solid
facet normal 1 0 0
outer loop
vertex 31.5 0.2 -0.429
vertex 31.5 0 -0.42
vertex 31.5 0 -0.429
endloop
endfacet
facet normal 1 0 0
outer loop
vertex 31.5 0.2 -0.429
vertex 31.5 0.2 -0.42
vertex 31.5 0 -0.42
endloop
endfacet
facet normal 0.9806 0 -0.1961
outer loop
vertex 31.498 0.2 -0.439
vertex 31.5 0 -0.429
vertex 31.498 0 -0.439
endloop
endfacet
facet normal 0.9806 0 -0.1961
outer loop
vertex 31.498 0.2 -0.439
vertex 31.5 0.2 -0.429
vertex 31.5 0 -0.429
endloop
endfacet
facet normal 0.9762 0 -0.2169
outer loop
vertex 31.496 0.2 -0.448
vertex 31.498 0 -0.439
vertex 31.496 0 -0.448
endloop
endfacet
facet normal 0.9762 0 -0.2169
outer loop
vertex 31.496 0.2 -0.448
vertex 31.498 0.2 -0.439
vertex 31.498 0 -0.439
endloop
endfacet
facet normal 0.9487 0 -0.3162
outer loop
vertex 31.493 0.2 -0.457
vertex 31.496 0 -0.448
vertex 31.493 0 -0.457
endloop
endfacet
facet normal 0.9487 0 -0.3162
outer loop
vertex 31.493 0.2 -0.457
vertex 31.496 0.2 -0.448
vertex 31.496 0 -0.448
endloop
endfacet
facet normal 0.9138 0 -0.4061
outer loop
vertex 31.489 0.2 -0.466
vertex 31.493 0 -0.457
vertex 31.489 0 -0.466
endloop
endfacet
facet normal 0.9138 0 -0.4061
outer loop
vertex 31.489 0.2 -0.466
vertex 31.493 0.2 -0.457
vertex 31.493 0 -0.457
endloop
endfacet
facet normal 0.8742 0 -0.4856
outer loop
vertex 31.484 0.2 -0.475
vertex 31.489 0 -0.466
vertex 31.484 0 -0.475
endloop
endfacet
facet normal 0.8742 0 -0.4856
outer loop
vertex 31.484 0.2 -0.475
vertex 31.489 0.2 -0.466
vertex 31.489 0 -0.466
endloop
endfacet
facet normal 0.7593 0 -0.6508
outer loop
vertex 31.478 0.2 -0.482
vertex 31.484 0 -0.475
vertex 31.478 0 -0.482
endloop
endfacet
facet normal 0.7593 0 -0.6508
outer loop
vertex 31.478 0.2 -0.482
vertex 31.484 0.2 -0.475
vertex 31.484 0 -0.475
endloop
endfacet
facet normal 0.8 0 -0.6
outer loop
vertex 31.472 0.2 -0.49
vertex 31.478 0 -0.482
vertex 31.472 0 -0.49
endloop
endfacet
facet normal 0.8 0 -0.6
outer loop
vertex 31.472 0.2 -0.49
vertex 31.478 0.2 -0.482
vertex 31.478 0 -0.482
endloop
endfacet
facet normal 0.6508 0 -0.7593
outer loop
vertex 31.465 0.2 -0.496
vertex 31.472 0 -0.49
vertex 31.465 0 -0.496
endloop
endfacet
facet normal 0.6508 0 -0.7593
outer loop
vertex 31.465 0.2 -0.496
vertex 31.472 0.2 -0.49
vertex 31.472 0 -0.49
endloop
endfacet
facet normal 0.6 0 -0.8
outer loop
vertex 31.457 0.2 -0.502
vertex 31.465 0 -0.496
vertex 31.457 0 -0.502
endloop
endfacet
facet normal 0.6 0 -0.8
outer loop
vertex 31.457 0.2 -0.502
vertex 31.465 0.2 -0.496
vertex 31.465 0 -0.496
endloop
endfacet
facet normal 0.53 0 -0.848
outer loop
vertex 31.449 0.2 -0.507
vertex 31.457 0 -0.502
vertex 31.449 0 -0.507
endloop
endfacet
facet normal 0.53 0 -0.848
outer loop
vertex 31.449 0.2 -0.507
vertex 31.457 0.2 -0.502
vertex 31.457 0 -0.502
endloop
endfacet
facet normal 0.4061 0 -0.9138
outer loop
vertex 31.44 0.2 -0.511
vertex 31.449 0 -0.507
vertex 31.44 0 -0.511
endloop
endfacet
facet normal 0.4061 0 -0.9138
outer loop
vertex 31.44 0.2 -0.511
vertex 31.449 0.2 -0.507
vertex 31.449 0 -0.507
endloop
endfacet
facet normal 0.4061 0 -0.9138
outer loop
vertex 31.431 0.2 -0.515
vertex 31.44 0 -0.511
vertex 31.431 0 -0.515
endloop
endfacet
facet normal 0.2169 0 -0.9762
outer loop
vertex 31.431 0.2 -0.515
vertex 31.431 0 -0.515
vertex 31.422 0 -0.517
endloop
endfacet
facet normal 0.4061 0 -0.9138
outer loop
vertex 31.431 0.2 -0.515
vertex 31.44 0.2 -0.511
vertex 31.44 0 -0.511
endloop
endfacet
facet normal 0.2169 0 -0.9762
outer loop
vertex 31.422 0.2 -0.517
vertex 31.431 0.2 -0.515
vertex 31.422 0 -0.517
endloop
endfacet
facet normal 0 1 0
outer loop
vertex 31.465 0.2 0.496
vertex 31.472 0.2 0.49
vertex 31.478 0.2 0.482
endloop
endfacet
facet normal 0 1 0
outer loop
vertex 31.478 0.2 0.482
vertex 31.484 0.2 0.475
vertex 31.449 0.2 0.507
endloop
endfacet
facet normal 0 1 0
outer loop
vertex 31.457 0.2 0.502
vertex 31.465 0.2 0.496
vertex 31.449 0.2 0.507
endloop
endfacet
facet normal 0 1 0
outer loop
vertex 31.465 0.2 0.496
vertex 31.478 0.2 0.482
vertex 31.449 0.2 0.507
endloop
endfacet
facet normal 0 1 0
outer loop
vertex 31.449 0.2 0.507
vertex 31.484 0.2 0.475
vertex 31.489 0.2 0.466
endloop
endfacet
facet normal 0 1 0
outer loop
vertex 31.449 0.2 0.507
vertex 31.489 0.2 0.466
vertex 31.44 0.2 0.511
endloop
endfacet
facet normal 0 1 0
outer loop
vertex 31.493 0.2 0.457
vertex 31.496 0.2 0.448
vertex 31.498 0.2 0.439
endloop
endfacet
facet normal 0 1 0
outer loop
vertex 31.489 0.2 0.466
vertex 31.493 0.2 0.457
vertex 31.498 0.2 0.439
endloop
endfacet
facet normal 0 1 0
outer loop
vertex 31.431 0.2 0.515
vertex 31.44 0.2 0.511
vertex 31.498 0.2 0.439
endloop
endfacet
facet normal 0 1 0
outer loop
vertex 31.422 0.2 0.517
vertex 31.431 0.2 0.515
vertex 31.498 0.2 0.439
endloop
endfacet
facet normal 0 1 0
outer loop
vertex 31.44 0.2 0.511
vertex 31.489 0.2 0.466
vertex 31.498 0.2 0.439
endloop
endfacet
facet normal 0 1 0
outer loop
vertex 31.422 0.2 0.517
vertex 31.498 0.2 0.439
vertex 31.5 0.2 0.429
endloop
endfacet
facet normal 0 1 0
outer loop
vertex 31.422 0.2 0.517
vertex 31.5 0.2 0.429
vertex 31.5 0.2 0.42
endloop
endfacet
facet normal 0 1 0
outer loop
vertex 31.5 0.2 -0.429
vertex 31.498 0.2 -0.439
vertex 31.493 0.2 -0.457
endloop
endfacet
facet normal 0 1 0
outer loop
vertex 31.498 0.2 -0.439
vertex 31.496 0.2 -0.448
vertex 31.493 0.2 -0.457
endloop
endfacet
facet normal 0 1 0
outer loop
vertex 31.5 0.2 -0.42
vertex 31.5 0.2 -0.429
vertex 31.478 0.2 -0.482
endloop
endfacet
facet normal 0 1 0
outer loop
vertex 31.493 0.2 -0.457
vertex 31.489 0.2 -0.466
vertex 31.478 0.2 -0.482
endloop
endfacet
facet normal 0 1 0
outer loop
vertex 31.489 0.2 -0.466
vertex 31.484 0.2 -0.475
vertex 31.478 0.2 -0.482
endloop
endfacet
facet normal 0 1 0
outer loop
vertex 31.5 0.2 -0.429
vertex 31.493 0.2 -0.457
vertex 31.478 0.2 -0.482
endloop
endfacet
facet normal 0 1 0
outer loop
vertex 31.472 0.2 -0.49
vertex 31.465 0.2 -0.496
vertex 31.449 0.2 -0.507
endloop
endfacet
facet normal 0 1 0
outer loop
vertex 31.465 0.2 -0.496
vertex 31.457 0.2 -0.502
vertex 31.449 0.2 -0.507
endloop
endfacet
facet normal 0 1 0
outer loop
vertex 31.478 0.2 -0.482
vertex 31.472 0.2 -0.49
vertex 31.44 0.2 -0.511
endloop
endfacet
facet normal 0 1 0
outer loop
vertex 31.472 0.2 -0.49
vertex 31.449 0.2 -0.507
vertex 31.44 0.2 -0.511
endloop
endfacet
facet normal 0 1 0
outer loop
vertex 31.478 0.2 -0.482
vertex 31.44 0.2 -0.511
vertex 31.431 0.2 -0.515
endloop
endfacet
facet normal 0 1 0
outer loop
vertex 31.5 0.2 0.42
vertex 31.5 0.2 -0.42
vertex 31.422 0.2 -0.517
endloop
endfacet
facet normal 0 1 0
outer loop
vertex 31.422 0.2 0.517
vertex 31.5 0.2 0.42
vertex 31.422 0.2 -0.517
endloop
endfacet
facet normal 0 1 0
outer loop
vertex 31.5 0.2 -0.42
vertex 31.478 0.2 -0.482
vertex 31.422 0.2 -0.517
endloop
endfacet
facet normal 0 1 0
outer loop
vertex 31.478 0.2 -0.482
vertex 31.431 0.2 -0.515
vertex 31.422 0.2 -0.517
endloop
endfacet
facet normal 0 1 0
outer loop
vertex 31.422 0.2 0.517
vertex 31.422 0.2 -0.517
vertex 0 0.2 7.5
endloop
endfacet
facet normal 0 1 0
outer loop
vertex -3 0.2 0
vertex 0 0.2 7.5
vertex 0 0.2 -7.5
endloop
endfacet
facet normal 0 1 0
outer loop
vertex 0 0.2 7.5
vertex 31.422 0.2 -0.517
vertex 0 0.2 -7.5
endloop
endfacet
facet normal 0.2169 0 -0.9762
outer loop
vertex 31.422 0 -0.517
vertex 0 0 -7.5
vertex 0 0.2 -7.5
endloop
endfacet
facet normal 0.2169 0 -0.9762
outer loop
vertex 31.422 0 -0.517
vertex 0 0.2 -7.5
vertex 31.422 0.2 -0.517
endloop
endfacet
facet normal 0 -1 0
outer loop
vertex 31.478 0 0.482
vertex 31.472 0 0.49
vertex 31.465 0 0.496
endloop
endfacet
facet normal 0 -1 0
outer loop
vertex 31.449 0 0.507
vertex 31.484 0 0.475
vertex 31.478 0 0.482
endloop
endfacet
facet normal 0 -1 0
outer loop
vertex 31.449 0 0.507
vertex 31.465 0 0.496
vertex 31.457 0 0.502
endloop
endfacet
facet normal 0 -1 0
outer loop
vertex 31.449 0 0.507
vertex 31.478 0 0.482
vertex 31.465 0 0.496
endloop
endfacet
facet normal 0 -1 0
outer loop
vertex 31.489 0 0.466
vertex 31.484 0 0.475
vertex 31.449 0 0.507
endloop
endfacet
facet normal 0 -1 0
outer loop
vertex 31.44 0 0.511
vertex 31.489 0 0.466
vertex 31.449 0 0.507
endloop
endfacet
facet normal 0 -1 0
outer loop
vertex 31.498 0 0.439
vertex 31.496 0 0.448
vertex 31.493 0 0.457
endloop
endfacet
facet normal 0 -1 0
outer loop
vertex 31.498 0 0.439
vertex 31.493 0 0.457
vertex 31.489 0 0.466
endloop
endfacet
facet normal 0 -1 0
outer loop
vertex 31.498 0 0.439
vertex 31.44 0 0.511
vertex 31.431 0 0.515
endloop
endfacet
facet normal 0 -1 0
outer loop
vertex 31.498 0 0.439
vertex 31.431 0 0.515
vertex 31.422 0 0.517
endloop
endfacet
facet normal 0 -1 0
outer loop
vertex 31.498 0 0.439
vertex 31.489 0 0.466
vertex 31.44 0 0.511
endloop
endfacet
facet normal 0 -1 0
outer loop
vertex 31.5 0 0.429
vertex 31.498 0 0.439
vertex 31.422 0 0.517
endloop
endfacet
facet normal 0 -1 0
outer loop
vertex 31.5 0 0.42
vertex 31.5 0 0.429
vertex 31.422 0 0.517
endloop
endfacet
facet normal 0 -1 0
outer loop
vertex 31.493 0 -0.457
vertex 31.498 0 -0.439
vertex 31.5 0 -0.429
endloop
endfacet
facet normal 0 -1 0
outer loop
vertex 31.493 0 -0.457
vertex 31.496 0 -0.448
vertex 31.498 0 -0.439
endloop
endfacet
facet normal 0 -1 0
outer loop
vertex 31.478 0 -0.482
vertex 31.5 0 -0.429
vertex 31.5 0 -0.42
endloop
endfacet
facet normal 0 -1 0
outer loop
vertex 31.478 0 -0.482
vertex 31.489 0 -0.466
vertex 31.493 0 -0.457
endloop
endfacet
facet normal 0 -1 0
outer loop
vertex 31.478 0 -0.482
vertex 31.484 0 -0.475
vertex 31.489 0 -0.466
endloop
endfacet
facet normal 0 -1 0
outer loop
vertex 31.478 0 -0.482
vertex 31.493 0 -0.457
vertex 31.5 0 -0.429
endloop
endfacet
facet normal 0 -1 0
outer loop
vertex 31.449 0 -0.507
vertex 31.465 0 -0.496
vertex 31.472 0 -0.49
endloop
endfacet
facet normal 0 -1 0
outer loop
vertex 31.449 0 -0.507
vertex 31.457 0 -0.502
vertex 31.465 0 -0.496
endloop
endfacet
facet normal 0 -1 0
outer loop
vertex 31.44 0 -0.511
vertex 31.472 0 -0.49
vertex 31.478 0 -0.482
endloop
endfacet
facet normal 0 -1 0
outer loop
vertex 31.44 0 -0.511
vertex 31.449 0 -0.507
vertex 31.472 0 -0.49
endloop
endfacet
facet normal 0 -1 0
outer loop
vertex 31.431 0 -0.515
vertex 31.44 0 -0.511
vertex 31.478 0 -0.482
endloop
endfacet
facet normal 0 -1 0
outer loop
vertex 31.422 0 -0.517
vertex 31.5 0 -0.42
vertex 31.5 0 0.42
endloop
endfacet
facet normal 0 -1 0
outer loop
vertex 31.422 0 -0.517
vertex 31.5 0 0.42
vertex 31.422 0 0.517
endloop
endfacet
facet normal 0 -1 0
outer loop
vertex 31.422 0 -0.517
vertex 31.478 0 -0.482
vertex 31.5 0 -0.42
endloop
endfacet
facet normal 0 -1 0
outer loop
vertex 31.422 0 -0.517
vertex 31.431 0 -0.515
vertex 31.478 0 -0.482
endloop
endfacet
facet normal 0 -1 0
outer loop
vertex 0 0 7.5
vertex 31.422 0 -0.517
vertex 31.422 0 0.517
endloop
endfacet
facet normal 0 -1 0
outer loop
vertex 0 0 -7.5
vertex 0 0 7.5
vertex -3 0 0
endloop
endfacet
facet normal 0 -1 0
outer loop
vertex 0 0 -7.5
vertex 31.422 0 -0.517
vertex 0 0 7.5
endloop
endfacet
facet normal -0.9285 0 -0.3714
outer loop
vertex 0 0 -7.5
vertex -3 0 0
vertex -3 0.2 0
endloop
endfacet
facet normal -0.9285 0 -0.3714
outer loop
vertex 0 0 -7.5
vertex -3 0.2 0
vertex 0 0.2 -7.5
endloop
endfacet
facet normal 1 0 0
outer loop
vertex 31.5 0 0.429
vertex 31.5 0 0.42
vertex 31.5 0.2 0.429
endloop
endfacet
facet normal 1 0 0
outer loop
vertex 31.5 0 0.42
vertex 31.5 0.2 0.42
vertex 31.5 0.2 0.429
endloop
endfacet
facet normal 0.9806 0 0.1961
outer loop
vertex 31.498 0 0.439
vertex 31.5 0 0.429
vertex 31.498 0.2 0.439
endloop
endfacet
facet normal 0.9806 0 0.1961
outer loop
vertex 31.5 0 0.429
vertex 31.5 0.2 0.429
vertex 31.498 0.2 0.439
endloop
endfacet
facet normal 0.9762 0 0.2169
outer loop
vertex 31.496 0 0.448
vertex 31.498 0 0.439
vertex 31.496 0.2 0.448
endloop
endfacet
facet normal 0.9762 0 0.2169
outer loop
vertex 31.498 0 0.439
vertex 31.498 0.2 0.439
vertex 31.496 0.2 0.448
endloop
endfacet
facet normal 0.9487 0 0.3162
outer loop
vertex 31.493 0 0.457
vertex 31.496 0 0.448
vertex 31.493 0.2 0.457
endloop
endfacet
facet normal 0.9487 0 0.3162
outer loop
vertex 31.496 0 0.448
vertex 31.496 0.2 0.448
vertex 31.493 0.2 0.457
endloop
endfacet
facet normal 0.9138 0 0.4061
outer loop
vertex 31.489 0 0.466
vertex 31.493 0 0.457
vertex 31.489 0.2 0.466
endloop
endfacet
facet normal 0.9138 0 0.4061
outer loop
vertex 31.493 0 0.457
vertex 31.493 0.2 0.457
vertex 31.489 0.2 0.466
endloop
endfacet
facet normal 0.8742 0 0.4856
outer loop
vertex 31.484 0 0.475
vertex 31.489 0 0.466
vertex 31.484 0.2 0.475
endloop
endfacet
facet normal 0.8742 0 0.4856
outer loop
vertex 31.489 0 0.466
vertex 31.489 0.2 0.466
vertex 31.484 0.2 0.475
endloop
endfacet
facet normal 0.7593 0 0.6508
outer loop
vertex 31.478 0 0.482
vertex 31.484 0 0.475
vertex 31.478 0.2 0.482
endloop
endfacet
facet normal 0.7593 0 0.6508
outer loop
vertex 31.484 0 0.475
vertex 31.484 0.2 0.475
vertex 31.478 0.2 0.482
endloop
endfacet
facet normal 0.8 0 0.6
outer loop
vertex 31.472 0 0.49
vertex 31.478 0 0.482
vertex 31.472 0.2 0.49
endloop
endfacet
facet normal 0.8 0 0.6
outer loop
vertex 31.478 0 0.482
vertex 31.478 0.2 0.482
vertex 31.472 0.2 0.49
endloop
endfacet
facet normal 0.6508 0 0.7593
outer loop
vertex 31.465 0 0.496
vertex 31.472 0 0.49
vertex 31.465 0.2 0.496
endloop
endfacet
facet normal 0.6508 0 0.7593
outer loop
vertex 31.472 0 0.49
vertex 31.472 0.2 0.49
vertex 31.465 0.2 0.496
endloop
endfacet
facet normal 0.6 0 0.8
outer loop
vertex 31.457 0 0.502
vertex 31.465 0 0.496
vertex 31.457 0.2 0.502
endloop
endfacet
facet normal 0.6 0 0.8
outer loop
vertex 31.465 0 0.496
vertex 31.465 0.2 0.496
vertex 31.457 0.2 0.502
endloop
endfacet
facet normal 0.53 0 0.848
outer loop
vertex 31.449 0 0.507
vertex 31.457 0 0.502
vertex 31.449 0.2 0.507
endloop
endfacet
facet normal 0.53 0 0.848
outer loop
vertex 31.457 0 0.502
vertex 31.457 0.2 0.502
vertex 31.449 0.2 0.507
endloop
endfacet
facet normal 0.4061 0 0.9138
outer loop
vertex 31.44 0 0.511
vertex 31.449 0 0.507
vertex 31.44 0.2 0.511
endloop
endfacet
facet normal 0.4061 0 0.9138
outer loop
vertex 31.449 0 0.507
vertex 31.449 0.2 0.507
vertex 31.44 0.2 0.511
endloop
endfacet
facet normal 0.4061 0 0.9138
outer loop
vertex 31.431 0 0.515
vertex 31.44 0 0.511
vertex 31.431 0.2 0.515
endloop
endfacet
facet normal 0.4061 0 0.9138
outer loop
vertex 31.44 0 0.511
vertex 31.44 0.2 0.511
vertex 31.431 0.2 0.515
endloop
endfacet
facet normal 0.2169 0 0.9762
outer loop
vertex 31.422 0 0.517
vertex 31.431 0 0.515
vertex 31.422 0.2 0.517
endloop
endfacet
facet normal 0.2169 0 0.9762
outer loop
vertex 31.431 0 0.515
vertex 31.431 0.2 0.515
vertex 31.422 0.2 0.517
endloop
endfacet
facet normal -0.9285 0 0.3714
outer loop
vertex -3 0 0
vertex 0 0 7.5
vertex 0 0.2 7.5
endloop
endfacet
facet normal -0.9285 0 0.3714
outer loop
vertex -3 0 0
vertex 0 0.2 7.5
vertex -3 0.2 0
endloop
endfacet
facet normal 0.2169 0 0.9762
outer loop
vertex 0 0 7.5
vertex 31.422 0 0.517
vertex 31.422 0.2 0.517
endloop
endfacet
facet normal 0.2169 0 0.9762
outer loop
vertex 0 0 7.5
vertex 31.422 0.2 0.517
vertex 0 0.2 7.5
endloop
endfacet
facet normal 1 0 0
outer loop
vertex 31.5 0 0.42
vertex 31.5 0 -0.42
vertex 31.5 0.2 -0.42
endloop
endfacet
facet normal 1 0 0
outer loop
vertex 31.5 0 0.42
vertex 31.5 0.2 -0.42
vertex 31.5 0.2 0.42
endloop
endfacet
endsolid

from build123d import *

# Parameters (mm, degrees)
BOSS_EXTRUDE1_DEPTH = 0.2
FILLET4_R           = 0.1
FILLET5_R           = 0.1


with BuildPart() as part:
    # Sketch2 → Boss-Extrude1 (new body)
    with BuildSketch(Plane(origin=(0, 0, 0), x_dir=(1, 0, 0), z_dir=(0, 1, 0))):
        Polygon((-3, 0), (1e-09, 7.5), (31.5, 0.5), (31.5, -0.5), (1e-09, -7.5), align=None)
    extrude(amount=BOSS_EXTRUDE1_DEPTH)

    # Fillet4
    fillet4_edges = [part.edges().sort_by_distance(p)[0] for p in [
        (31.5, 0.1, 0.5),
    ]]
    fillet(fillet4_edges, radius=FILLET4_R)

    # Fillet5
    fillet5_edges = [part.edges().sort_by_distance(p)[0] for p in [
        (31.5, 0.1, -0.5),
    ]]
    fillet(fillet5_edges, radius=FILLET5_R)


solid = part.part
